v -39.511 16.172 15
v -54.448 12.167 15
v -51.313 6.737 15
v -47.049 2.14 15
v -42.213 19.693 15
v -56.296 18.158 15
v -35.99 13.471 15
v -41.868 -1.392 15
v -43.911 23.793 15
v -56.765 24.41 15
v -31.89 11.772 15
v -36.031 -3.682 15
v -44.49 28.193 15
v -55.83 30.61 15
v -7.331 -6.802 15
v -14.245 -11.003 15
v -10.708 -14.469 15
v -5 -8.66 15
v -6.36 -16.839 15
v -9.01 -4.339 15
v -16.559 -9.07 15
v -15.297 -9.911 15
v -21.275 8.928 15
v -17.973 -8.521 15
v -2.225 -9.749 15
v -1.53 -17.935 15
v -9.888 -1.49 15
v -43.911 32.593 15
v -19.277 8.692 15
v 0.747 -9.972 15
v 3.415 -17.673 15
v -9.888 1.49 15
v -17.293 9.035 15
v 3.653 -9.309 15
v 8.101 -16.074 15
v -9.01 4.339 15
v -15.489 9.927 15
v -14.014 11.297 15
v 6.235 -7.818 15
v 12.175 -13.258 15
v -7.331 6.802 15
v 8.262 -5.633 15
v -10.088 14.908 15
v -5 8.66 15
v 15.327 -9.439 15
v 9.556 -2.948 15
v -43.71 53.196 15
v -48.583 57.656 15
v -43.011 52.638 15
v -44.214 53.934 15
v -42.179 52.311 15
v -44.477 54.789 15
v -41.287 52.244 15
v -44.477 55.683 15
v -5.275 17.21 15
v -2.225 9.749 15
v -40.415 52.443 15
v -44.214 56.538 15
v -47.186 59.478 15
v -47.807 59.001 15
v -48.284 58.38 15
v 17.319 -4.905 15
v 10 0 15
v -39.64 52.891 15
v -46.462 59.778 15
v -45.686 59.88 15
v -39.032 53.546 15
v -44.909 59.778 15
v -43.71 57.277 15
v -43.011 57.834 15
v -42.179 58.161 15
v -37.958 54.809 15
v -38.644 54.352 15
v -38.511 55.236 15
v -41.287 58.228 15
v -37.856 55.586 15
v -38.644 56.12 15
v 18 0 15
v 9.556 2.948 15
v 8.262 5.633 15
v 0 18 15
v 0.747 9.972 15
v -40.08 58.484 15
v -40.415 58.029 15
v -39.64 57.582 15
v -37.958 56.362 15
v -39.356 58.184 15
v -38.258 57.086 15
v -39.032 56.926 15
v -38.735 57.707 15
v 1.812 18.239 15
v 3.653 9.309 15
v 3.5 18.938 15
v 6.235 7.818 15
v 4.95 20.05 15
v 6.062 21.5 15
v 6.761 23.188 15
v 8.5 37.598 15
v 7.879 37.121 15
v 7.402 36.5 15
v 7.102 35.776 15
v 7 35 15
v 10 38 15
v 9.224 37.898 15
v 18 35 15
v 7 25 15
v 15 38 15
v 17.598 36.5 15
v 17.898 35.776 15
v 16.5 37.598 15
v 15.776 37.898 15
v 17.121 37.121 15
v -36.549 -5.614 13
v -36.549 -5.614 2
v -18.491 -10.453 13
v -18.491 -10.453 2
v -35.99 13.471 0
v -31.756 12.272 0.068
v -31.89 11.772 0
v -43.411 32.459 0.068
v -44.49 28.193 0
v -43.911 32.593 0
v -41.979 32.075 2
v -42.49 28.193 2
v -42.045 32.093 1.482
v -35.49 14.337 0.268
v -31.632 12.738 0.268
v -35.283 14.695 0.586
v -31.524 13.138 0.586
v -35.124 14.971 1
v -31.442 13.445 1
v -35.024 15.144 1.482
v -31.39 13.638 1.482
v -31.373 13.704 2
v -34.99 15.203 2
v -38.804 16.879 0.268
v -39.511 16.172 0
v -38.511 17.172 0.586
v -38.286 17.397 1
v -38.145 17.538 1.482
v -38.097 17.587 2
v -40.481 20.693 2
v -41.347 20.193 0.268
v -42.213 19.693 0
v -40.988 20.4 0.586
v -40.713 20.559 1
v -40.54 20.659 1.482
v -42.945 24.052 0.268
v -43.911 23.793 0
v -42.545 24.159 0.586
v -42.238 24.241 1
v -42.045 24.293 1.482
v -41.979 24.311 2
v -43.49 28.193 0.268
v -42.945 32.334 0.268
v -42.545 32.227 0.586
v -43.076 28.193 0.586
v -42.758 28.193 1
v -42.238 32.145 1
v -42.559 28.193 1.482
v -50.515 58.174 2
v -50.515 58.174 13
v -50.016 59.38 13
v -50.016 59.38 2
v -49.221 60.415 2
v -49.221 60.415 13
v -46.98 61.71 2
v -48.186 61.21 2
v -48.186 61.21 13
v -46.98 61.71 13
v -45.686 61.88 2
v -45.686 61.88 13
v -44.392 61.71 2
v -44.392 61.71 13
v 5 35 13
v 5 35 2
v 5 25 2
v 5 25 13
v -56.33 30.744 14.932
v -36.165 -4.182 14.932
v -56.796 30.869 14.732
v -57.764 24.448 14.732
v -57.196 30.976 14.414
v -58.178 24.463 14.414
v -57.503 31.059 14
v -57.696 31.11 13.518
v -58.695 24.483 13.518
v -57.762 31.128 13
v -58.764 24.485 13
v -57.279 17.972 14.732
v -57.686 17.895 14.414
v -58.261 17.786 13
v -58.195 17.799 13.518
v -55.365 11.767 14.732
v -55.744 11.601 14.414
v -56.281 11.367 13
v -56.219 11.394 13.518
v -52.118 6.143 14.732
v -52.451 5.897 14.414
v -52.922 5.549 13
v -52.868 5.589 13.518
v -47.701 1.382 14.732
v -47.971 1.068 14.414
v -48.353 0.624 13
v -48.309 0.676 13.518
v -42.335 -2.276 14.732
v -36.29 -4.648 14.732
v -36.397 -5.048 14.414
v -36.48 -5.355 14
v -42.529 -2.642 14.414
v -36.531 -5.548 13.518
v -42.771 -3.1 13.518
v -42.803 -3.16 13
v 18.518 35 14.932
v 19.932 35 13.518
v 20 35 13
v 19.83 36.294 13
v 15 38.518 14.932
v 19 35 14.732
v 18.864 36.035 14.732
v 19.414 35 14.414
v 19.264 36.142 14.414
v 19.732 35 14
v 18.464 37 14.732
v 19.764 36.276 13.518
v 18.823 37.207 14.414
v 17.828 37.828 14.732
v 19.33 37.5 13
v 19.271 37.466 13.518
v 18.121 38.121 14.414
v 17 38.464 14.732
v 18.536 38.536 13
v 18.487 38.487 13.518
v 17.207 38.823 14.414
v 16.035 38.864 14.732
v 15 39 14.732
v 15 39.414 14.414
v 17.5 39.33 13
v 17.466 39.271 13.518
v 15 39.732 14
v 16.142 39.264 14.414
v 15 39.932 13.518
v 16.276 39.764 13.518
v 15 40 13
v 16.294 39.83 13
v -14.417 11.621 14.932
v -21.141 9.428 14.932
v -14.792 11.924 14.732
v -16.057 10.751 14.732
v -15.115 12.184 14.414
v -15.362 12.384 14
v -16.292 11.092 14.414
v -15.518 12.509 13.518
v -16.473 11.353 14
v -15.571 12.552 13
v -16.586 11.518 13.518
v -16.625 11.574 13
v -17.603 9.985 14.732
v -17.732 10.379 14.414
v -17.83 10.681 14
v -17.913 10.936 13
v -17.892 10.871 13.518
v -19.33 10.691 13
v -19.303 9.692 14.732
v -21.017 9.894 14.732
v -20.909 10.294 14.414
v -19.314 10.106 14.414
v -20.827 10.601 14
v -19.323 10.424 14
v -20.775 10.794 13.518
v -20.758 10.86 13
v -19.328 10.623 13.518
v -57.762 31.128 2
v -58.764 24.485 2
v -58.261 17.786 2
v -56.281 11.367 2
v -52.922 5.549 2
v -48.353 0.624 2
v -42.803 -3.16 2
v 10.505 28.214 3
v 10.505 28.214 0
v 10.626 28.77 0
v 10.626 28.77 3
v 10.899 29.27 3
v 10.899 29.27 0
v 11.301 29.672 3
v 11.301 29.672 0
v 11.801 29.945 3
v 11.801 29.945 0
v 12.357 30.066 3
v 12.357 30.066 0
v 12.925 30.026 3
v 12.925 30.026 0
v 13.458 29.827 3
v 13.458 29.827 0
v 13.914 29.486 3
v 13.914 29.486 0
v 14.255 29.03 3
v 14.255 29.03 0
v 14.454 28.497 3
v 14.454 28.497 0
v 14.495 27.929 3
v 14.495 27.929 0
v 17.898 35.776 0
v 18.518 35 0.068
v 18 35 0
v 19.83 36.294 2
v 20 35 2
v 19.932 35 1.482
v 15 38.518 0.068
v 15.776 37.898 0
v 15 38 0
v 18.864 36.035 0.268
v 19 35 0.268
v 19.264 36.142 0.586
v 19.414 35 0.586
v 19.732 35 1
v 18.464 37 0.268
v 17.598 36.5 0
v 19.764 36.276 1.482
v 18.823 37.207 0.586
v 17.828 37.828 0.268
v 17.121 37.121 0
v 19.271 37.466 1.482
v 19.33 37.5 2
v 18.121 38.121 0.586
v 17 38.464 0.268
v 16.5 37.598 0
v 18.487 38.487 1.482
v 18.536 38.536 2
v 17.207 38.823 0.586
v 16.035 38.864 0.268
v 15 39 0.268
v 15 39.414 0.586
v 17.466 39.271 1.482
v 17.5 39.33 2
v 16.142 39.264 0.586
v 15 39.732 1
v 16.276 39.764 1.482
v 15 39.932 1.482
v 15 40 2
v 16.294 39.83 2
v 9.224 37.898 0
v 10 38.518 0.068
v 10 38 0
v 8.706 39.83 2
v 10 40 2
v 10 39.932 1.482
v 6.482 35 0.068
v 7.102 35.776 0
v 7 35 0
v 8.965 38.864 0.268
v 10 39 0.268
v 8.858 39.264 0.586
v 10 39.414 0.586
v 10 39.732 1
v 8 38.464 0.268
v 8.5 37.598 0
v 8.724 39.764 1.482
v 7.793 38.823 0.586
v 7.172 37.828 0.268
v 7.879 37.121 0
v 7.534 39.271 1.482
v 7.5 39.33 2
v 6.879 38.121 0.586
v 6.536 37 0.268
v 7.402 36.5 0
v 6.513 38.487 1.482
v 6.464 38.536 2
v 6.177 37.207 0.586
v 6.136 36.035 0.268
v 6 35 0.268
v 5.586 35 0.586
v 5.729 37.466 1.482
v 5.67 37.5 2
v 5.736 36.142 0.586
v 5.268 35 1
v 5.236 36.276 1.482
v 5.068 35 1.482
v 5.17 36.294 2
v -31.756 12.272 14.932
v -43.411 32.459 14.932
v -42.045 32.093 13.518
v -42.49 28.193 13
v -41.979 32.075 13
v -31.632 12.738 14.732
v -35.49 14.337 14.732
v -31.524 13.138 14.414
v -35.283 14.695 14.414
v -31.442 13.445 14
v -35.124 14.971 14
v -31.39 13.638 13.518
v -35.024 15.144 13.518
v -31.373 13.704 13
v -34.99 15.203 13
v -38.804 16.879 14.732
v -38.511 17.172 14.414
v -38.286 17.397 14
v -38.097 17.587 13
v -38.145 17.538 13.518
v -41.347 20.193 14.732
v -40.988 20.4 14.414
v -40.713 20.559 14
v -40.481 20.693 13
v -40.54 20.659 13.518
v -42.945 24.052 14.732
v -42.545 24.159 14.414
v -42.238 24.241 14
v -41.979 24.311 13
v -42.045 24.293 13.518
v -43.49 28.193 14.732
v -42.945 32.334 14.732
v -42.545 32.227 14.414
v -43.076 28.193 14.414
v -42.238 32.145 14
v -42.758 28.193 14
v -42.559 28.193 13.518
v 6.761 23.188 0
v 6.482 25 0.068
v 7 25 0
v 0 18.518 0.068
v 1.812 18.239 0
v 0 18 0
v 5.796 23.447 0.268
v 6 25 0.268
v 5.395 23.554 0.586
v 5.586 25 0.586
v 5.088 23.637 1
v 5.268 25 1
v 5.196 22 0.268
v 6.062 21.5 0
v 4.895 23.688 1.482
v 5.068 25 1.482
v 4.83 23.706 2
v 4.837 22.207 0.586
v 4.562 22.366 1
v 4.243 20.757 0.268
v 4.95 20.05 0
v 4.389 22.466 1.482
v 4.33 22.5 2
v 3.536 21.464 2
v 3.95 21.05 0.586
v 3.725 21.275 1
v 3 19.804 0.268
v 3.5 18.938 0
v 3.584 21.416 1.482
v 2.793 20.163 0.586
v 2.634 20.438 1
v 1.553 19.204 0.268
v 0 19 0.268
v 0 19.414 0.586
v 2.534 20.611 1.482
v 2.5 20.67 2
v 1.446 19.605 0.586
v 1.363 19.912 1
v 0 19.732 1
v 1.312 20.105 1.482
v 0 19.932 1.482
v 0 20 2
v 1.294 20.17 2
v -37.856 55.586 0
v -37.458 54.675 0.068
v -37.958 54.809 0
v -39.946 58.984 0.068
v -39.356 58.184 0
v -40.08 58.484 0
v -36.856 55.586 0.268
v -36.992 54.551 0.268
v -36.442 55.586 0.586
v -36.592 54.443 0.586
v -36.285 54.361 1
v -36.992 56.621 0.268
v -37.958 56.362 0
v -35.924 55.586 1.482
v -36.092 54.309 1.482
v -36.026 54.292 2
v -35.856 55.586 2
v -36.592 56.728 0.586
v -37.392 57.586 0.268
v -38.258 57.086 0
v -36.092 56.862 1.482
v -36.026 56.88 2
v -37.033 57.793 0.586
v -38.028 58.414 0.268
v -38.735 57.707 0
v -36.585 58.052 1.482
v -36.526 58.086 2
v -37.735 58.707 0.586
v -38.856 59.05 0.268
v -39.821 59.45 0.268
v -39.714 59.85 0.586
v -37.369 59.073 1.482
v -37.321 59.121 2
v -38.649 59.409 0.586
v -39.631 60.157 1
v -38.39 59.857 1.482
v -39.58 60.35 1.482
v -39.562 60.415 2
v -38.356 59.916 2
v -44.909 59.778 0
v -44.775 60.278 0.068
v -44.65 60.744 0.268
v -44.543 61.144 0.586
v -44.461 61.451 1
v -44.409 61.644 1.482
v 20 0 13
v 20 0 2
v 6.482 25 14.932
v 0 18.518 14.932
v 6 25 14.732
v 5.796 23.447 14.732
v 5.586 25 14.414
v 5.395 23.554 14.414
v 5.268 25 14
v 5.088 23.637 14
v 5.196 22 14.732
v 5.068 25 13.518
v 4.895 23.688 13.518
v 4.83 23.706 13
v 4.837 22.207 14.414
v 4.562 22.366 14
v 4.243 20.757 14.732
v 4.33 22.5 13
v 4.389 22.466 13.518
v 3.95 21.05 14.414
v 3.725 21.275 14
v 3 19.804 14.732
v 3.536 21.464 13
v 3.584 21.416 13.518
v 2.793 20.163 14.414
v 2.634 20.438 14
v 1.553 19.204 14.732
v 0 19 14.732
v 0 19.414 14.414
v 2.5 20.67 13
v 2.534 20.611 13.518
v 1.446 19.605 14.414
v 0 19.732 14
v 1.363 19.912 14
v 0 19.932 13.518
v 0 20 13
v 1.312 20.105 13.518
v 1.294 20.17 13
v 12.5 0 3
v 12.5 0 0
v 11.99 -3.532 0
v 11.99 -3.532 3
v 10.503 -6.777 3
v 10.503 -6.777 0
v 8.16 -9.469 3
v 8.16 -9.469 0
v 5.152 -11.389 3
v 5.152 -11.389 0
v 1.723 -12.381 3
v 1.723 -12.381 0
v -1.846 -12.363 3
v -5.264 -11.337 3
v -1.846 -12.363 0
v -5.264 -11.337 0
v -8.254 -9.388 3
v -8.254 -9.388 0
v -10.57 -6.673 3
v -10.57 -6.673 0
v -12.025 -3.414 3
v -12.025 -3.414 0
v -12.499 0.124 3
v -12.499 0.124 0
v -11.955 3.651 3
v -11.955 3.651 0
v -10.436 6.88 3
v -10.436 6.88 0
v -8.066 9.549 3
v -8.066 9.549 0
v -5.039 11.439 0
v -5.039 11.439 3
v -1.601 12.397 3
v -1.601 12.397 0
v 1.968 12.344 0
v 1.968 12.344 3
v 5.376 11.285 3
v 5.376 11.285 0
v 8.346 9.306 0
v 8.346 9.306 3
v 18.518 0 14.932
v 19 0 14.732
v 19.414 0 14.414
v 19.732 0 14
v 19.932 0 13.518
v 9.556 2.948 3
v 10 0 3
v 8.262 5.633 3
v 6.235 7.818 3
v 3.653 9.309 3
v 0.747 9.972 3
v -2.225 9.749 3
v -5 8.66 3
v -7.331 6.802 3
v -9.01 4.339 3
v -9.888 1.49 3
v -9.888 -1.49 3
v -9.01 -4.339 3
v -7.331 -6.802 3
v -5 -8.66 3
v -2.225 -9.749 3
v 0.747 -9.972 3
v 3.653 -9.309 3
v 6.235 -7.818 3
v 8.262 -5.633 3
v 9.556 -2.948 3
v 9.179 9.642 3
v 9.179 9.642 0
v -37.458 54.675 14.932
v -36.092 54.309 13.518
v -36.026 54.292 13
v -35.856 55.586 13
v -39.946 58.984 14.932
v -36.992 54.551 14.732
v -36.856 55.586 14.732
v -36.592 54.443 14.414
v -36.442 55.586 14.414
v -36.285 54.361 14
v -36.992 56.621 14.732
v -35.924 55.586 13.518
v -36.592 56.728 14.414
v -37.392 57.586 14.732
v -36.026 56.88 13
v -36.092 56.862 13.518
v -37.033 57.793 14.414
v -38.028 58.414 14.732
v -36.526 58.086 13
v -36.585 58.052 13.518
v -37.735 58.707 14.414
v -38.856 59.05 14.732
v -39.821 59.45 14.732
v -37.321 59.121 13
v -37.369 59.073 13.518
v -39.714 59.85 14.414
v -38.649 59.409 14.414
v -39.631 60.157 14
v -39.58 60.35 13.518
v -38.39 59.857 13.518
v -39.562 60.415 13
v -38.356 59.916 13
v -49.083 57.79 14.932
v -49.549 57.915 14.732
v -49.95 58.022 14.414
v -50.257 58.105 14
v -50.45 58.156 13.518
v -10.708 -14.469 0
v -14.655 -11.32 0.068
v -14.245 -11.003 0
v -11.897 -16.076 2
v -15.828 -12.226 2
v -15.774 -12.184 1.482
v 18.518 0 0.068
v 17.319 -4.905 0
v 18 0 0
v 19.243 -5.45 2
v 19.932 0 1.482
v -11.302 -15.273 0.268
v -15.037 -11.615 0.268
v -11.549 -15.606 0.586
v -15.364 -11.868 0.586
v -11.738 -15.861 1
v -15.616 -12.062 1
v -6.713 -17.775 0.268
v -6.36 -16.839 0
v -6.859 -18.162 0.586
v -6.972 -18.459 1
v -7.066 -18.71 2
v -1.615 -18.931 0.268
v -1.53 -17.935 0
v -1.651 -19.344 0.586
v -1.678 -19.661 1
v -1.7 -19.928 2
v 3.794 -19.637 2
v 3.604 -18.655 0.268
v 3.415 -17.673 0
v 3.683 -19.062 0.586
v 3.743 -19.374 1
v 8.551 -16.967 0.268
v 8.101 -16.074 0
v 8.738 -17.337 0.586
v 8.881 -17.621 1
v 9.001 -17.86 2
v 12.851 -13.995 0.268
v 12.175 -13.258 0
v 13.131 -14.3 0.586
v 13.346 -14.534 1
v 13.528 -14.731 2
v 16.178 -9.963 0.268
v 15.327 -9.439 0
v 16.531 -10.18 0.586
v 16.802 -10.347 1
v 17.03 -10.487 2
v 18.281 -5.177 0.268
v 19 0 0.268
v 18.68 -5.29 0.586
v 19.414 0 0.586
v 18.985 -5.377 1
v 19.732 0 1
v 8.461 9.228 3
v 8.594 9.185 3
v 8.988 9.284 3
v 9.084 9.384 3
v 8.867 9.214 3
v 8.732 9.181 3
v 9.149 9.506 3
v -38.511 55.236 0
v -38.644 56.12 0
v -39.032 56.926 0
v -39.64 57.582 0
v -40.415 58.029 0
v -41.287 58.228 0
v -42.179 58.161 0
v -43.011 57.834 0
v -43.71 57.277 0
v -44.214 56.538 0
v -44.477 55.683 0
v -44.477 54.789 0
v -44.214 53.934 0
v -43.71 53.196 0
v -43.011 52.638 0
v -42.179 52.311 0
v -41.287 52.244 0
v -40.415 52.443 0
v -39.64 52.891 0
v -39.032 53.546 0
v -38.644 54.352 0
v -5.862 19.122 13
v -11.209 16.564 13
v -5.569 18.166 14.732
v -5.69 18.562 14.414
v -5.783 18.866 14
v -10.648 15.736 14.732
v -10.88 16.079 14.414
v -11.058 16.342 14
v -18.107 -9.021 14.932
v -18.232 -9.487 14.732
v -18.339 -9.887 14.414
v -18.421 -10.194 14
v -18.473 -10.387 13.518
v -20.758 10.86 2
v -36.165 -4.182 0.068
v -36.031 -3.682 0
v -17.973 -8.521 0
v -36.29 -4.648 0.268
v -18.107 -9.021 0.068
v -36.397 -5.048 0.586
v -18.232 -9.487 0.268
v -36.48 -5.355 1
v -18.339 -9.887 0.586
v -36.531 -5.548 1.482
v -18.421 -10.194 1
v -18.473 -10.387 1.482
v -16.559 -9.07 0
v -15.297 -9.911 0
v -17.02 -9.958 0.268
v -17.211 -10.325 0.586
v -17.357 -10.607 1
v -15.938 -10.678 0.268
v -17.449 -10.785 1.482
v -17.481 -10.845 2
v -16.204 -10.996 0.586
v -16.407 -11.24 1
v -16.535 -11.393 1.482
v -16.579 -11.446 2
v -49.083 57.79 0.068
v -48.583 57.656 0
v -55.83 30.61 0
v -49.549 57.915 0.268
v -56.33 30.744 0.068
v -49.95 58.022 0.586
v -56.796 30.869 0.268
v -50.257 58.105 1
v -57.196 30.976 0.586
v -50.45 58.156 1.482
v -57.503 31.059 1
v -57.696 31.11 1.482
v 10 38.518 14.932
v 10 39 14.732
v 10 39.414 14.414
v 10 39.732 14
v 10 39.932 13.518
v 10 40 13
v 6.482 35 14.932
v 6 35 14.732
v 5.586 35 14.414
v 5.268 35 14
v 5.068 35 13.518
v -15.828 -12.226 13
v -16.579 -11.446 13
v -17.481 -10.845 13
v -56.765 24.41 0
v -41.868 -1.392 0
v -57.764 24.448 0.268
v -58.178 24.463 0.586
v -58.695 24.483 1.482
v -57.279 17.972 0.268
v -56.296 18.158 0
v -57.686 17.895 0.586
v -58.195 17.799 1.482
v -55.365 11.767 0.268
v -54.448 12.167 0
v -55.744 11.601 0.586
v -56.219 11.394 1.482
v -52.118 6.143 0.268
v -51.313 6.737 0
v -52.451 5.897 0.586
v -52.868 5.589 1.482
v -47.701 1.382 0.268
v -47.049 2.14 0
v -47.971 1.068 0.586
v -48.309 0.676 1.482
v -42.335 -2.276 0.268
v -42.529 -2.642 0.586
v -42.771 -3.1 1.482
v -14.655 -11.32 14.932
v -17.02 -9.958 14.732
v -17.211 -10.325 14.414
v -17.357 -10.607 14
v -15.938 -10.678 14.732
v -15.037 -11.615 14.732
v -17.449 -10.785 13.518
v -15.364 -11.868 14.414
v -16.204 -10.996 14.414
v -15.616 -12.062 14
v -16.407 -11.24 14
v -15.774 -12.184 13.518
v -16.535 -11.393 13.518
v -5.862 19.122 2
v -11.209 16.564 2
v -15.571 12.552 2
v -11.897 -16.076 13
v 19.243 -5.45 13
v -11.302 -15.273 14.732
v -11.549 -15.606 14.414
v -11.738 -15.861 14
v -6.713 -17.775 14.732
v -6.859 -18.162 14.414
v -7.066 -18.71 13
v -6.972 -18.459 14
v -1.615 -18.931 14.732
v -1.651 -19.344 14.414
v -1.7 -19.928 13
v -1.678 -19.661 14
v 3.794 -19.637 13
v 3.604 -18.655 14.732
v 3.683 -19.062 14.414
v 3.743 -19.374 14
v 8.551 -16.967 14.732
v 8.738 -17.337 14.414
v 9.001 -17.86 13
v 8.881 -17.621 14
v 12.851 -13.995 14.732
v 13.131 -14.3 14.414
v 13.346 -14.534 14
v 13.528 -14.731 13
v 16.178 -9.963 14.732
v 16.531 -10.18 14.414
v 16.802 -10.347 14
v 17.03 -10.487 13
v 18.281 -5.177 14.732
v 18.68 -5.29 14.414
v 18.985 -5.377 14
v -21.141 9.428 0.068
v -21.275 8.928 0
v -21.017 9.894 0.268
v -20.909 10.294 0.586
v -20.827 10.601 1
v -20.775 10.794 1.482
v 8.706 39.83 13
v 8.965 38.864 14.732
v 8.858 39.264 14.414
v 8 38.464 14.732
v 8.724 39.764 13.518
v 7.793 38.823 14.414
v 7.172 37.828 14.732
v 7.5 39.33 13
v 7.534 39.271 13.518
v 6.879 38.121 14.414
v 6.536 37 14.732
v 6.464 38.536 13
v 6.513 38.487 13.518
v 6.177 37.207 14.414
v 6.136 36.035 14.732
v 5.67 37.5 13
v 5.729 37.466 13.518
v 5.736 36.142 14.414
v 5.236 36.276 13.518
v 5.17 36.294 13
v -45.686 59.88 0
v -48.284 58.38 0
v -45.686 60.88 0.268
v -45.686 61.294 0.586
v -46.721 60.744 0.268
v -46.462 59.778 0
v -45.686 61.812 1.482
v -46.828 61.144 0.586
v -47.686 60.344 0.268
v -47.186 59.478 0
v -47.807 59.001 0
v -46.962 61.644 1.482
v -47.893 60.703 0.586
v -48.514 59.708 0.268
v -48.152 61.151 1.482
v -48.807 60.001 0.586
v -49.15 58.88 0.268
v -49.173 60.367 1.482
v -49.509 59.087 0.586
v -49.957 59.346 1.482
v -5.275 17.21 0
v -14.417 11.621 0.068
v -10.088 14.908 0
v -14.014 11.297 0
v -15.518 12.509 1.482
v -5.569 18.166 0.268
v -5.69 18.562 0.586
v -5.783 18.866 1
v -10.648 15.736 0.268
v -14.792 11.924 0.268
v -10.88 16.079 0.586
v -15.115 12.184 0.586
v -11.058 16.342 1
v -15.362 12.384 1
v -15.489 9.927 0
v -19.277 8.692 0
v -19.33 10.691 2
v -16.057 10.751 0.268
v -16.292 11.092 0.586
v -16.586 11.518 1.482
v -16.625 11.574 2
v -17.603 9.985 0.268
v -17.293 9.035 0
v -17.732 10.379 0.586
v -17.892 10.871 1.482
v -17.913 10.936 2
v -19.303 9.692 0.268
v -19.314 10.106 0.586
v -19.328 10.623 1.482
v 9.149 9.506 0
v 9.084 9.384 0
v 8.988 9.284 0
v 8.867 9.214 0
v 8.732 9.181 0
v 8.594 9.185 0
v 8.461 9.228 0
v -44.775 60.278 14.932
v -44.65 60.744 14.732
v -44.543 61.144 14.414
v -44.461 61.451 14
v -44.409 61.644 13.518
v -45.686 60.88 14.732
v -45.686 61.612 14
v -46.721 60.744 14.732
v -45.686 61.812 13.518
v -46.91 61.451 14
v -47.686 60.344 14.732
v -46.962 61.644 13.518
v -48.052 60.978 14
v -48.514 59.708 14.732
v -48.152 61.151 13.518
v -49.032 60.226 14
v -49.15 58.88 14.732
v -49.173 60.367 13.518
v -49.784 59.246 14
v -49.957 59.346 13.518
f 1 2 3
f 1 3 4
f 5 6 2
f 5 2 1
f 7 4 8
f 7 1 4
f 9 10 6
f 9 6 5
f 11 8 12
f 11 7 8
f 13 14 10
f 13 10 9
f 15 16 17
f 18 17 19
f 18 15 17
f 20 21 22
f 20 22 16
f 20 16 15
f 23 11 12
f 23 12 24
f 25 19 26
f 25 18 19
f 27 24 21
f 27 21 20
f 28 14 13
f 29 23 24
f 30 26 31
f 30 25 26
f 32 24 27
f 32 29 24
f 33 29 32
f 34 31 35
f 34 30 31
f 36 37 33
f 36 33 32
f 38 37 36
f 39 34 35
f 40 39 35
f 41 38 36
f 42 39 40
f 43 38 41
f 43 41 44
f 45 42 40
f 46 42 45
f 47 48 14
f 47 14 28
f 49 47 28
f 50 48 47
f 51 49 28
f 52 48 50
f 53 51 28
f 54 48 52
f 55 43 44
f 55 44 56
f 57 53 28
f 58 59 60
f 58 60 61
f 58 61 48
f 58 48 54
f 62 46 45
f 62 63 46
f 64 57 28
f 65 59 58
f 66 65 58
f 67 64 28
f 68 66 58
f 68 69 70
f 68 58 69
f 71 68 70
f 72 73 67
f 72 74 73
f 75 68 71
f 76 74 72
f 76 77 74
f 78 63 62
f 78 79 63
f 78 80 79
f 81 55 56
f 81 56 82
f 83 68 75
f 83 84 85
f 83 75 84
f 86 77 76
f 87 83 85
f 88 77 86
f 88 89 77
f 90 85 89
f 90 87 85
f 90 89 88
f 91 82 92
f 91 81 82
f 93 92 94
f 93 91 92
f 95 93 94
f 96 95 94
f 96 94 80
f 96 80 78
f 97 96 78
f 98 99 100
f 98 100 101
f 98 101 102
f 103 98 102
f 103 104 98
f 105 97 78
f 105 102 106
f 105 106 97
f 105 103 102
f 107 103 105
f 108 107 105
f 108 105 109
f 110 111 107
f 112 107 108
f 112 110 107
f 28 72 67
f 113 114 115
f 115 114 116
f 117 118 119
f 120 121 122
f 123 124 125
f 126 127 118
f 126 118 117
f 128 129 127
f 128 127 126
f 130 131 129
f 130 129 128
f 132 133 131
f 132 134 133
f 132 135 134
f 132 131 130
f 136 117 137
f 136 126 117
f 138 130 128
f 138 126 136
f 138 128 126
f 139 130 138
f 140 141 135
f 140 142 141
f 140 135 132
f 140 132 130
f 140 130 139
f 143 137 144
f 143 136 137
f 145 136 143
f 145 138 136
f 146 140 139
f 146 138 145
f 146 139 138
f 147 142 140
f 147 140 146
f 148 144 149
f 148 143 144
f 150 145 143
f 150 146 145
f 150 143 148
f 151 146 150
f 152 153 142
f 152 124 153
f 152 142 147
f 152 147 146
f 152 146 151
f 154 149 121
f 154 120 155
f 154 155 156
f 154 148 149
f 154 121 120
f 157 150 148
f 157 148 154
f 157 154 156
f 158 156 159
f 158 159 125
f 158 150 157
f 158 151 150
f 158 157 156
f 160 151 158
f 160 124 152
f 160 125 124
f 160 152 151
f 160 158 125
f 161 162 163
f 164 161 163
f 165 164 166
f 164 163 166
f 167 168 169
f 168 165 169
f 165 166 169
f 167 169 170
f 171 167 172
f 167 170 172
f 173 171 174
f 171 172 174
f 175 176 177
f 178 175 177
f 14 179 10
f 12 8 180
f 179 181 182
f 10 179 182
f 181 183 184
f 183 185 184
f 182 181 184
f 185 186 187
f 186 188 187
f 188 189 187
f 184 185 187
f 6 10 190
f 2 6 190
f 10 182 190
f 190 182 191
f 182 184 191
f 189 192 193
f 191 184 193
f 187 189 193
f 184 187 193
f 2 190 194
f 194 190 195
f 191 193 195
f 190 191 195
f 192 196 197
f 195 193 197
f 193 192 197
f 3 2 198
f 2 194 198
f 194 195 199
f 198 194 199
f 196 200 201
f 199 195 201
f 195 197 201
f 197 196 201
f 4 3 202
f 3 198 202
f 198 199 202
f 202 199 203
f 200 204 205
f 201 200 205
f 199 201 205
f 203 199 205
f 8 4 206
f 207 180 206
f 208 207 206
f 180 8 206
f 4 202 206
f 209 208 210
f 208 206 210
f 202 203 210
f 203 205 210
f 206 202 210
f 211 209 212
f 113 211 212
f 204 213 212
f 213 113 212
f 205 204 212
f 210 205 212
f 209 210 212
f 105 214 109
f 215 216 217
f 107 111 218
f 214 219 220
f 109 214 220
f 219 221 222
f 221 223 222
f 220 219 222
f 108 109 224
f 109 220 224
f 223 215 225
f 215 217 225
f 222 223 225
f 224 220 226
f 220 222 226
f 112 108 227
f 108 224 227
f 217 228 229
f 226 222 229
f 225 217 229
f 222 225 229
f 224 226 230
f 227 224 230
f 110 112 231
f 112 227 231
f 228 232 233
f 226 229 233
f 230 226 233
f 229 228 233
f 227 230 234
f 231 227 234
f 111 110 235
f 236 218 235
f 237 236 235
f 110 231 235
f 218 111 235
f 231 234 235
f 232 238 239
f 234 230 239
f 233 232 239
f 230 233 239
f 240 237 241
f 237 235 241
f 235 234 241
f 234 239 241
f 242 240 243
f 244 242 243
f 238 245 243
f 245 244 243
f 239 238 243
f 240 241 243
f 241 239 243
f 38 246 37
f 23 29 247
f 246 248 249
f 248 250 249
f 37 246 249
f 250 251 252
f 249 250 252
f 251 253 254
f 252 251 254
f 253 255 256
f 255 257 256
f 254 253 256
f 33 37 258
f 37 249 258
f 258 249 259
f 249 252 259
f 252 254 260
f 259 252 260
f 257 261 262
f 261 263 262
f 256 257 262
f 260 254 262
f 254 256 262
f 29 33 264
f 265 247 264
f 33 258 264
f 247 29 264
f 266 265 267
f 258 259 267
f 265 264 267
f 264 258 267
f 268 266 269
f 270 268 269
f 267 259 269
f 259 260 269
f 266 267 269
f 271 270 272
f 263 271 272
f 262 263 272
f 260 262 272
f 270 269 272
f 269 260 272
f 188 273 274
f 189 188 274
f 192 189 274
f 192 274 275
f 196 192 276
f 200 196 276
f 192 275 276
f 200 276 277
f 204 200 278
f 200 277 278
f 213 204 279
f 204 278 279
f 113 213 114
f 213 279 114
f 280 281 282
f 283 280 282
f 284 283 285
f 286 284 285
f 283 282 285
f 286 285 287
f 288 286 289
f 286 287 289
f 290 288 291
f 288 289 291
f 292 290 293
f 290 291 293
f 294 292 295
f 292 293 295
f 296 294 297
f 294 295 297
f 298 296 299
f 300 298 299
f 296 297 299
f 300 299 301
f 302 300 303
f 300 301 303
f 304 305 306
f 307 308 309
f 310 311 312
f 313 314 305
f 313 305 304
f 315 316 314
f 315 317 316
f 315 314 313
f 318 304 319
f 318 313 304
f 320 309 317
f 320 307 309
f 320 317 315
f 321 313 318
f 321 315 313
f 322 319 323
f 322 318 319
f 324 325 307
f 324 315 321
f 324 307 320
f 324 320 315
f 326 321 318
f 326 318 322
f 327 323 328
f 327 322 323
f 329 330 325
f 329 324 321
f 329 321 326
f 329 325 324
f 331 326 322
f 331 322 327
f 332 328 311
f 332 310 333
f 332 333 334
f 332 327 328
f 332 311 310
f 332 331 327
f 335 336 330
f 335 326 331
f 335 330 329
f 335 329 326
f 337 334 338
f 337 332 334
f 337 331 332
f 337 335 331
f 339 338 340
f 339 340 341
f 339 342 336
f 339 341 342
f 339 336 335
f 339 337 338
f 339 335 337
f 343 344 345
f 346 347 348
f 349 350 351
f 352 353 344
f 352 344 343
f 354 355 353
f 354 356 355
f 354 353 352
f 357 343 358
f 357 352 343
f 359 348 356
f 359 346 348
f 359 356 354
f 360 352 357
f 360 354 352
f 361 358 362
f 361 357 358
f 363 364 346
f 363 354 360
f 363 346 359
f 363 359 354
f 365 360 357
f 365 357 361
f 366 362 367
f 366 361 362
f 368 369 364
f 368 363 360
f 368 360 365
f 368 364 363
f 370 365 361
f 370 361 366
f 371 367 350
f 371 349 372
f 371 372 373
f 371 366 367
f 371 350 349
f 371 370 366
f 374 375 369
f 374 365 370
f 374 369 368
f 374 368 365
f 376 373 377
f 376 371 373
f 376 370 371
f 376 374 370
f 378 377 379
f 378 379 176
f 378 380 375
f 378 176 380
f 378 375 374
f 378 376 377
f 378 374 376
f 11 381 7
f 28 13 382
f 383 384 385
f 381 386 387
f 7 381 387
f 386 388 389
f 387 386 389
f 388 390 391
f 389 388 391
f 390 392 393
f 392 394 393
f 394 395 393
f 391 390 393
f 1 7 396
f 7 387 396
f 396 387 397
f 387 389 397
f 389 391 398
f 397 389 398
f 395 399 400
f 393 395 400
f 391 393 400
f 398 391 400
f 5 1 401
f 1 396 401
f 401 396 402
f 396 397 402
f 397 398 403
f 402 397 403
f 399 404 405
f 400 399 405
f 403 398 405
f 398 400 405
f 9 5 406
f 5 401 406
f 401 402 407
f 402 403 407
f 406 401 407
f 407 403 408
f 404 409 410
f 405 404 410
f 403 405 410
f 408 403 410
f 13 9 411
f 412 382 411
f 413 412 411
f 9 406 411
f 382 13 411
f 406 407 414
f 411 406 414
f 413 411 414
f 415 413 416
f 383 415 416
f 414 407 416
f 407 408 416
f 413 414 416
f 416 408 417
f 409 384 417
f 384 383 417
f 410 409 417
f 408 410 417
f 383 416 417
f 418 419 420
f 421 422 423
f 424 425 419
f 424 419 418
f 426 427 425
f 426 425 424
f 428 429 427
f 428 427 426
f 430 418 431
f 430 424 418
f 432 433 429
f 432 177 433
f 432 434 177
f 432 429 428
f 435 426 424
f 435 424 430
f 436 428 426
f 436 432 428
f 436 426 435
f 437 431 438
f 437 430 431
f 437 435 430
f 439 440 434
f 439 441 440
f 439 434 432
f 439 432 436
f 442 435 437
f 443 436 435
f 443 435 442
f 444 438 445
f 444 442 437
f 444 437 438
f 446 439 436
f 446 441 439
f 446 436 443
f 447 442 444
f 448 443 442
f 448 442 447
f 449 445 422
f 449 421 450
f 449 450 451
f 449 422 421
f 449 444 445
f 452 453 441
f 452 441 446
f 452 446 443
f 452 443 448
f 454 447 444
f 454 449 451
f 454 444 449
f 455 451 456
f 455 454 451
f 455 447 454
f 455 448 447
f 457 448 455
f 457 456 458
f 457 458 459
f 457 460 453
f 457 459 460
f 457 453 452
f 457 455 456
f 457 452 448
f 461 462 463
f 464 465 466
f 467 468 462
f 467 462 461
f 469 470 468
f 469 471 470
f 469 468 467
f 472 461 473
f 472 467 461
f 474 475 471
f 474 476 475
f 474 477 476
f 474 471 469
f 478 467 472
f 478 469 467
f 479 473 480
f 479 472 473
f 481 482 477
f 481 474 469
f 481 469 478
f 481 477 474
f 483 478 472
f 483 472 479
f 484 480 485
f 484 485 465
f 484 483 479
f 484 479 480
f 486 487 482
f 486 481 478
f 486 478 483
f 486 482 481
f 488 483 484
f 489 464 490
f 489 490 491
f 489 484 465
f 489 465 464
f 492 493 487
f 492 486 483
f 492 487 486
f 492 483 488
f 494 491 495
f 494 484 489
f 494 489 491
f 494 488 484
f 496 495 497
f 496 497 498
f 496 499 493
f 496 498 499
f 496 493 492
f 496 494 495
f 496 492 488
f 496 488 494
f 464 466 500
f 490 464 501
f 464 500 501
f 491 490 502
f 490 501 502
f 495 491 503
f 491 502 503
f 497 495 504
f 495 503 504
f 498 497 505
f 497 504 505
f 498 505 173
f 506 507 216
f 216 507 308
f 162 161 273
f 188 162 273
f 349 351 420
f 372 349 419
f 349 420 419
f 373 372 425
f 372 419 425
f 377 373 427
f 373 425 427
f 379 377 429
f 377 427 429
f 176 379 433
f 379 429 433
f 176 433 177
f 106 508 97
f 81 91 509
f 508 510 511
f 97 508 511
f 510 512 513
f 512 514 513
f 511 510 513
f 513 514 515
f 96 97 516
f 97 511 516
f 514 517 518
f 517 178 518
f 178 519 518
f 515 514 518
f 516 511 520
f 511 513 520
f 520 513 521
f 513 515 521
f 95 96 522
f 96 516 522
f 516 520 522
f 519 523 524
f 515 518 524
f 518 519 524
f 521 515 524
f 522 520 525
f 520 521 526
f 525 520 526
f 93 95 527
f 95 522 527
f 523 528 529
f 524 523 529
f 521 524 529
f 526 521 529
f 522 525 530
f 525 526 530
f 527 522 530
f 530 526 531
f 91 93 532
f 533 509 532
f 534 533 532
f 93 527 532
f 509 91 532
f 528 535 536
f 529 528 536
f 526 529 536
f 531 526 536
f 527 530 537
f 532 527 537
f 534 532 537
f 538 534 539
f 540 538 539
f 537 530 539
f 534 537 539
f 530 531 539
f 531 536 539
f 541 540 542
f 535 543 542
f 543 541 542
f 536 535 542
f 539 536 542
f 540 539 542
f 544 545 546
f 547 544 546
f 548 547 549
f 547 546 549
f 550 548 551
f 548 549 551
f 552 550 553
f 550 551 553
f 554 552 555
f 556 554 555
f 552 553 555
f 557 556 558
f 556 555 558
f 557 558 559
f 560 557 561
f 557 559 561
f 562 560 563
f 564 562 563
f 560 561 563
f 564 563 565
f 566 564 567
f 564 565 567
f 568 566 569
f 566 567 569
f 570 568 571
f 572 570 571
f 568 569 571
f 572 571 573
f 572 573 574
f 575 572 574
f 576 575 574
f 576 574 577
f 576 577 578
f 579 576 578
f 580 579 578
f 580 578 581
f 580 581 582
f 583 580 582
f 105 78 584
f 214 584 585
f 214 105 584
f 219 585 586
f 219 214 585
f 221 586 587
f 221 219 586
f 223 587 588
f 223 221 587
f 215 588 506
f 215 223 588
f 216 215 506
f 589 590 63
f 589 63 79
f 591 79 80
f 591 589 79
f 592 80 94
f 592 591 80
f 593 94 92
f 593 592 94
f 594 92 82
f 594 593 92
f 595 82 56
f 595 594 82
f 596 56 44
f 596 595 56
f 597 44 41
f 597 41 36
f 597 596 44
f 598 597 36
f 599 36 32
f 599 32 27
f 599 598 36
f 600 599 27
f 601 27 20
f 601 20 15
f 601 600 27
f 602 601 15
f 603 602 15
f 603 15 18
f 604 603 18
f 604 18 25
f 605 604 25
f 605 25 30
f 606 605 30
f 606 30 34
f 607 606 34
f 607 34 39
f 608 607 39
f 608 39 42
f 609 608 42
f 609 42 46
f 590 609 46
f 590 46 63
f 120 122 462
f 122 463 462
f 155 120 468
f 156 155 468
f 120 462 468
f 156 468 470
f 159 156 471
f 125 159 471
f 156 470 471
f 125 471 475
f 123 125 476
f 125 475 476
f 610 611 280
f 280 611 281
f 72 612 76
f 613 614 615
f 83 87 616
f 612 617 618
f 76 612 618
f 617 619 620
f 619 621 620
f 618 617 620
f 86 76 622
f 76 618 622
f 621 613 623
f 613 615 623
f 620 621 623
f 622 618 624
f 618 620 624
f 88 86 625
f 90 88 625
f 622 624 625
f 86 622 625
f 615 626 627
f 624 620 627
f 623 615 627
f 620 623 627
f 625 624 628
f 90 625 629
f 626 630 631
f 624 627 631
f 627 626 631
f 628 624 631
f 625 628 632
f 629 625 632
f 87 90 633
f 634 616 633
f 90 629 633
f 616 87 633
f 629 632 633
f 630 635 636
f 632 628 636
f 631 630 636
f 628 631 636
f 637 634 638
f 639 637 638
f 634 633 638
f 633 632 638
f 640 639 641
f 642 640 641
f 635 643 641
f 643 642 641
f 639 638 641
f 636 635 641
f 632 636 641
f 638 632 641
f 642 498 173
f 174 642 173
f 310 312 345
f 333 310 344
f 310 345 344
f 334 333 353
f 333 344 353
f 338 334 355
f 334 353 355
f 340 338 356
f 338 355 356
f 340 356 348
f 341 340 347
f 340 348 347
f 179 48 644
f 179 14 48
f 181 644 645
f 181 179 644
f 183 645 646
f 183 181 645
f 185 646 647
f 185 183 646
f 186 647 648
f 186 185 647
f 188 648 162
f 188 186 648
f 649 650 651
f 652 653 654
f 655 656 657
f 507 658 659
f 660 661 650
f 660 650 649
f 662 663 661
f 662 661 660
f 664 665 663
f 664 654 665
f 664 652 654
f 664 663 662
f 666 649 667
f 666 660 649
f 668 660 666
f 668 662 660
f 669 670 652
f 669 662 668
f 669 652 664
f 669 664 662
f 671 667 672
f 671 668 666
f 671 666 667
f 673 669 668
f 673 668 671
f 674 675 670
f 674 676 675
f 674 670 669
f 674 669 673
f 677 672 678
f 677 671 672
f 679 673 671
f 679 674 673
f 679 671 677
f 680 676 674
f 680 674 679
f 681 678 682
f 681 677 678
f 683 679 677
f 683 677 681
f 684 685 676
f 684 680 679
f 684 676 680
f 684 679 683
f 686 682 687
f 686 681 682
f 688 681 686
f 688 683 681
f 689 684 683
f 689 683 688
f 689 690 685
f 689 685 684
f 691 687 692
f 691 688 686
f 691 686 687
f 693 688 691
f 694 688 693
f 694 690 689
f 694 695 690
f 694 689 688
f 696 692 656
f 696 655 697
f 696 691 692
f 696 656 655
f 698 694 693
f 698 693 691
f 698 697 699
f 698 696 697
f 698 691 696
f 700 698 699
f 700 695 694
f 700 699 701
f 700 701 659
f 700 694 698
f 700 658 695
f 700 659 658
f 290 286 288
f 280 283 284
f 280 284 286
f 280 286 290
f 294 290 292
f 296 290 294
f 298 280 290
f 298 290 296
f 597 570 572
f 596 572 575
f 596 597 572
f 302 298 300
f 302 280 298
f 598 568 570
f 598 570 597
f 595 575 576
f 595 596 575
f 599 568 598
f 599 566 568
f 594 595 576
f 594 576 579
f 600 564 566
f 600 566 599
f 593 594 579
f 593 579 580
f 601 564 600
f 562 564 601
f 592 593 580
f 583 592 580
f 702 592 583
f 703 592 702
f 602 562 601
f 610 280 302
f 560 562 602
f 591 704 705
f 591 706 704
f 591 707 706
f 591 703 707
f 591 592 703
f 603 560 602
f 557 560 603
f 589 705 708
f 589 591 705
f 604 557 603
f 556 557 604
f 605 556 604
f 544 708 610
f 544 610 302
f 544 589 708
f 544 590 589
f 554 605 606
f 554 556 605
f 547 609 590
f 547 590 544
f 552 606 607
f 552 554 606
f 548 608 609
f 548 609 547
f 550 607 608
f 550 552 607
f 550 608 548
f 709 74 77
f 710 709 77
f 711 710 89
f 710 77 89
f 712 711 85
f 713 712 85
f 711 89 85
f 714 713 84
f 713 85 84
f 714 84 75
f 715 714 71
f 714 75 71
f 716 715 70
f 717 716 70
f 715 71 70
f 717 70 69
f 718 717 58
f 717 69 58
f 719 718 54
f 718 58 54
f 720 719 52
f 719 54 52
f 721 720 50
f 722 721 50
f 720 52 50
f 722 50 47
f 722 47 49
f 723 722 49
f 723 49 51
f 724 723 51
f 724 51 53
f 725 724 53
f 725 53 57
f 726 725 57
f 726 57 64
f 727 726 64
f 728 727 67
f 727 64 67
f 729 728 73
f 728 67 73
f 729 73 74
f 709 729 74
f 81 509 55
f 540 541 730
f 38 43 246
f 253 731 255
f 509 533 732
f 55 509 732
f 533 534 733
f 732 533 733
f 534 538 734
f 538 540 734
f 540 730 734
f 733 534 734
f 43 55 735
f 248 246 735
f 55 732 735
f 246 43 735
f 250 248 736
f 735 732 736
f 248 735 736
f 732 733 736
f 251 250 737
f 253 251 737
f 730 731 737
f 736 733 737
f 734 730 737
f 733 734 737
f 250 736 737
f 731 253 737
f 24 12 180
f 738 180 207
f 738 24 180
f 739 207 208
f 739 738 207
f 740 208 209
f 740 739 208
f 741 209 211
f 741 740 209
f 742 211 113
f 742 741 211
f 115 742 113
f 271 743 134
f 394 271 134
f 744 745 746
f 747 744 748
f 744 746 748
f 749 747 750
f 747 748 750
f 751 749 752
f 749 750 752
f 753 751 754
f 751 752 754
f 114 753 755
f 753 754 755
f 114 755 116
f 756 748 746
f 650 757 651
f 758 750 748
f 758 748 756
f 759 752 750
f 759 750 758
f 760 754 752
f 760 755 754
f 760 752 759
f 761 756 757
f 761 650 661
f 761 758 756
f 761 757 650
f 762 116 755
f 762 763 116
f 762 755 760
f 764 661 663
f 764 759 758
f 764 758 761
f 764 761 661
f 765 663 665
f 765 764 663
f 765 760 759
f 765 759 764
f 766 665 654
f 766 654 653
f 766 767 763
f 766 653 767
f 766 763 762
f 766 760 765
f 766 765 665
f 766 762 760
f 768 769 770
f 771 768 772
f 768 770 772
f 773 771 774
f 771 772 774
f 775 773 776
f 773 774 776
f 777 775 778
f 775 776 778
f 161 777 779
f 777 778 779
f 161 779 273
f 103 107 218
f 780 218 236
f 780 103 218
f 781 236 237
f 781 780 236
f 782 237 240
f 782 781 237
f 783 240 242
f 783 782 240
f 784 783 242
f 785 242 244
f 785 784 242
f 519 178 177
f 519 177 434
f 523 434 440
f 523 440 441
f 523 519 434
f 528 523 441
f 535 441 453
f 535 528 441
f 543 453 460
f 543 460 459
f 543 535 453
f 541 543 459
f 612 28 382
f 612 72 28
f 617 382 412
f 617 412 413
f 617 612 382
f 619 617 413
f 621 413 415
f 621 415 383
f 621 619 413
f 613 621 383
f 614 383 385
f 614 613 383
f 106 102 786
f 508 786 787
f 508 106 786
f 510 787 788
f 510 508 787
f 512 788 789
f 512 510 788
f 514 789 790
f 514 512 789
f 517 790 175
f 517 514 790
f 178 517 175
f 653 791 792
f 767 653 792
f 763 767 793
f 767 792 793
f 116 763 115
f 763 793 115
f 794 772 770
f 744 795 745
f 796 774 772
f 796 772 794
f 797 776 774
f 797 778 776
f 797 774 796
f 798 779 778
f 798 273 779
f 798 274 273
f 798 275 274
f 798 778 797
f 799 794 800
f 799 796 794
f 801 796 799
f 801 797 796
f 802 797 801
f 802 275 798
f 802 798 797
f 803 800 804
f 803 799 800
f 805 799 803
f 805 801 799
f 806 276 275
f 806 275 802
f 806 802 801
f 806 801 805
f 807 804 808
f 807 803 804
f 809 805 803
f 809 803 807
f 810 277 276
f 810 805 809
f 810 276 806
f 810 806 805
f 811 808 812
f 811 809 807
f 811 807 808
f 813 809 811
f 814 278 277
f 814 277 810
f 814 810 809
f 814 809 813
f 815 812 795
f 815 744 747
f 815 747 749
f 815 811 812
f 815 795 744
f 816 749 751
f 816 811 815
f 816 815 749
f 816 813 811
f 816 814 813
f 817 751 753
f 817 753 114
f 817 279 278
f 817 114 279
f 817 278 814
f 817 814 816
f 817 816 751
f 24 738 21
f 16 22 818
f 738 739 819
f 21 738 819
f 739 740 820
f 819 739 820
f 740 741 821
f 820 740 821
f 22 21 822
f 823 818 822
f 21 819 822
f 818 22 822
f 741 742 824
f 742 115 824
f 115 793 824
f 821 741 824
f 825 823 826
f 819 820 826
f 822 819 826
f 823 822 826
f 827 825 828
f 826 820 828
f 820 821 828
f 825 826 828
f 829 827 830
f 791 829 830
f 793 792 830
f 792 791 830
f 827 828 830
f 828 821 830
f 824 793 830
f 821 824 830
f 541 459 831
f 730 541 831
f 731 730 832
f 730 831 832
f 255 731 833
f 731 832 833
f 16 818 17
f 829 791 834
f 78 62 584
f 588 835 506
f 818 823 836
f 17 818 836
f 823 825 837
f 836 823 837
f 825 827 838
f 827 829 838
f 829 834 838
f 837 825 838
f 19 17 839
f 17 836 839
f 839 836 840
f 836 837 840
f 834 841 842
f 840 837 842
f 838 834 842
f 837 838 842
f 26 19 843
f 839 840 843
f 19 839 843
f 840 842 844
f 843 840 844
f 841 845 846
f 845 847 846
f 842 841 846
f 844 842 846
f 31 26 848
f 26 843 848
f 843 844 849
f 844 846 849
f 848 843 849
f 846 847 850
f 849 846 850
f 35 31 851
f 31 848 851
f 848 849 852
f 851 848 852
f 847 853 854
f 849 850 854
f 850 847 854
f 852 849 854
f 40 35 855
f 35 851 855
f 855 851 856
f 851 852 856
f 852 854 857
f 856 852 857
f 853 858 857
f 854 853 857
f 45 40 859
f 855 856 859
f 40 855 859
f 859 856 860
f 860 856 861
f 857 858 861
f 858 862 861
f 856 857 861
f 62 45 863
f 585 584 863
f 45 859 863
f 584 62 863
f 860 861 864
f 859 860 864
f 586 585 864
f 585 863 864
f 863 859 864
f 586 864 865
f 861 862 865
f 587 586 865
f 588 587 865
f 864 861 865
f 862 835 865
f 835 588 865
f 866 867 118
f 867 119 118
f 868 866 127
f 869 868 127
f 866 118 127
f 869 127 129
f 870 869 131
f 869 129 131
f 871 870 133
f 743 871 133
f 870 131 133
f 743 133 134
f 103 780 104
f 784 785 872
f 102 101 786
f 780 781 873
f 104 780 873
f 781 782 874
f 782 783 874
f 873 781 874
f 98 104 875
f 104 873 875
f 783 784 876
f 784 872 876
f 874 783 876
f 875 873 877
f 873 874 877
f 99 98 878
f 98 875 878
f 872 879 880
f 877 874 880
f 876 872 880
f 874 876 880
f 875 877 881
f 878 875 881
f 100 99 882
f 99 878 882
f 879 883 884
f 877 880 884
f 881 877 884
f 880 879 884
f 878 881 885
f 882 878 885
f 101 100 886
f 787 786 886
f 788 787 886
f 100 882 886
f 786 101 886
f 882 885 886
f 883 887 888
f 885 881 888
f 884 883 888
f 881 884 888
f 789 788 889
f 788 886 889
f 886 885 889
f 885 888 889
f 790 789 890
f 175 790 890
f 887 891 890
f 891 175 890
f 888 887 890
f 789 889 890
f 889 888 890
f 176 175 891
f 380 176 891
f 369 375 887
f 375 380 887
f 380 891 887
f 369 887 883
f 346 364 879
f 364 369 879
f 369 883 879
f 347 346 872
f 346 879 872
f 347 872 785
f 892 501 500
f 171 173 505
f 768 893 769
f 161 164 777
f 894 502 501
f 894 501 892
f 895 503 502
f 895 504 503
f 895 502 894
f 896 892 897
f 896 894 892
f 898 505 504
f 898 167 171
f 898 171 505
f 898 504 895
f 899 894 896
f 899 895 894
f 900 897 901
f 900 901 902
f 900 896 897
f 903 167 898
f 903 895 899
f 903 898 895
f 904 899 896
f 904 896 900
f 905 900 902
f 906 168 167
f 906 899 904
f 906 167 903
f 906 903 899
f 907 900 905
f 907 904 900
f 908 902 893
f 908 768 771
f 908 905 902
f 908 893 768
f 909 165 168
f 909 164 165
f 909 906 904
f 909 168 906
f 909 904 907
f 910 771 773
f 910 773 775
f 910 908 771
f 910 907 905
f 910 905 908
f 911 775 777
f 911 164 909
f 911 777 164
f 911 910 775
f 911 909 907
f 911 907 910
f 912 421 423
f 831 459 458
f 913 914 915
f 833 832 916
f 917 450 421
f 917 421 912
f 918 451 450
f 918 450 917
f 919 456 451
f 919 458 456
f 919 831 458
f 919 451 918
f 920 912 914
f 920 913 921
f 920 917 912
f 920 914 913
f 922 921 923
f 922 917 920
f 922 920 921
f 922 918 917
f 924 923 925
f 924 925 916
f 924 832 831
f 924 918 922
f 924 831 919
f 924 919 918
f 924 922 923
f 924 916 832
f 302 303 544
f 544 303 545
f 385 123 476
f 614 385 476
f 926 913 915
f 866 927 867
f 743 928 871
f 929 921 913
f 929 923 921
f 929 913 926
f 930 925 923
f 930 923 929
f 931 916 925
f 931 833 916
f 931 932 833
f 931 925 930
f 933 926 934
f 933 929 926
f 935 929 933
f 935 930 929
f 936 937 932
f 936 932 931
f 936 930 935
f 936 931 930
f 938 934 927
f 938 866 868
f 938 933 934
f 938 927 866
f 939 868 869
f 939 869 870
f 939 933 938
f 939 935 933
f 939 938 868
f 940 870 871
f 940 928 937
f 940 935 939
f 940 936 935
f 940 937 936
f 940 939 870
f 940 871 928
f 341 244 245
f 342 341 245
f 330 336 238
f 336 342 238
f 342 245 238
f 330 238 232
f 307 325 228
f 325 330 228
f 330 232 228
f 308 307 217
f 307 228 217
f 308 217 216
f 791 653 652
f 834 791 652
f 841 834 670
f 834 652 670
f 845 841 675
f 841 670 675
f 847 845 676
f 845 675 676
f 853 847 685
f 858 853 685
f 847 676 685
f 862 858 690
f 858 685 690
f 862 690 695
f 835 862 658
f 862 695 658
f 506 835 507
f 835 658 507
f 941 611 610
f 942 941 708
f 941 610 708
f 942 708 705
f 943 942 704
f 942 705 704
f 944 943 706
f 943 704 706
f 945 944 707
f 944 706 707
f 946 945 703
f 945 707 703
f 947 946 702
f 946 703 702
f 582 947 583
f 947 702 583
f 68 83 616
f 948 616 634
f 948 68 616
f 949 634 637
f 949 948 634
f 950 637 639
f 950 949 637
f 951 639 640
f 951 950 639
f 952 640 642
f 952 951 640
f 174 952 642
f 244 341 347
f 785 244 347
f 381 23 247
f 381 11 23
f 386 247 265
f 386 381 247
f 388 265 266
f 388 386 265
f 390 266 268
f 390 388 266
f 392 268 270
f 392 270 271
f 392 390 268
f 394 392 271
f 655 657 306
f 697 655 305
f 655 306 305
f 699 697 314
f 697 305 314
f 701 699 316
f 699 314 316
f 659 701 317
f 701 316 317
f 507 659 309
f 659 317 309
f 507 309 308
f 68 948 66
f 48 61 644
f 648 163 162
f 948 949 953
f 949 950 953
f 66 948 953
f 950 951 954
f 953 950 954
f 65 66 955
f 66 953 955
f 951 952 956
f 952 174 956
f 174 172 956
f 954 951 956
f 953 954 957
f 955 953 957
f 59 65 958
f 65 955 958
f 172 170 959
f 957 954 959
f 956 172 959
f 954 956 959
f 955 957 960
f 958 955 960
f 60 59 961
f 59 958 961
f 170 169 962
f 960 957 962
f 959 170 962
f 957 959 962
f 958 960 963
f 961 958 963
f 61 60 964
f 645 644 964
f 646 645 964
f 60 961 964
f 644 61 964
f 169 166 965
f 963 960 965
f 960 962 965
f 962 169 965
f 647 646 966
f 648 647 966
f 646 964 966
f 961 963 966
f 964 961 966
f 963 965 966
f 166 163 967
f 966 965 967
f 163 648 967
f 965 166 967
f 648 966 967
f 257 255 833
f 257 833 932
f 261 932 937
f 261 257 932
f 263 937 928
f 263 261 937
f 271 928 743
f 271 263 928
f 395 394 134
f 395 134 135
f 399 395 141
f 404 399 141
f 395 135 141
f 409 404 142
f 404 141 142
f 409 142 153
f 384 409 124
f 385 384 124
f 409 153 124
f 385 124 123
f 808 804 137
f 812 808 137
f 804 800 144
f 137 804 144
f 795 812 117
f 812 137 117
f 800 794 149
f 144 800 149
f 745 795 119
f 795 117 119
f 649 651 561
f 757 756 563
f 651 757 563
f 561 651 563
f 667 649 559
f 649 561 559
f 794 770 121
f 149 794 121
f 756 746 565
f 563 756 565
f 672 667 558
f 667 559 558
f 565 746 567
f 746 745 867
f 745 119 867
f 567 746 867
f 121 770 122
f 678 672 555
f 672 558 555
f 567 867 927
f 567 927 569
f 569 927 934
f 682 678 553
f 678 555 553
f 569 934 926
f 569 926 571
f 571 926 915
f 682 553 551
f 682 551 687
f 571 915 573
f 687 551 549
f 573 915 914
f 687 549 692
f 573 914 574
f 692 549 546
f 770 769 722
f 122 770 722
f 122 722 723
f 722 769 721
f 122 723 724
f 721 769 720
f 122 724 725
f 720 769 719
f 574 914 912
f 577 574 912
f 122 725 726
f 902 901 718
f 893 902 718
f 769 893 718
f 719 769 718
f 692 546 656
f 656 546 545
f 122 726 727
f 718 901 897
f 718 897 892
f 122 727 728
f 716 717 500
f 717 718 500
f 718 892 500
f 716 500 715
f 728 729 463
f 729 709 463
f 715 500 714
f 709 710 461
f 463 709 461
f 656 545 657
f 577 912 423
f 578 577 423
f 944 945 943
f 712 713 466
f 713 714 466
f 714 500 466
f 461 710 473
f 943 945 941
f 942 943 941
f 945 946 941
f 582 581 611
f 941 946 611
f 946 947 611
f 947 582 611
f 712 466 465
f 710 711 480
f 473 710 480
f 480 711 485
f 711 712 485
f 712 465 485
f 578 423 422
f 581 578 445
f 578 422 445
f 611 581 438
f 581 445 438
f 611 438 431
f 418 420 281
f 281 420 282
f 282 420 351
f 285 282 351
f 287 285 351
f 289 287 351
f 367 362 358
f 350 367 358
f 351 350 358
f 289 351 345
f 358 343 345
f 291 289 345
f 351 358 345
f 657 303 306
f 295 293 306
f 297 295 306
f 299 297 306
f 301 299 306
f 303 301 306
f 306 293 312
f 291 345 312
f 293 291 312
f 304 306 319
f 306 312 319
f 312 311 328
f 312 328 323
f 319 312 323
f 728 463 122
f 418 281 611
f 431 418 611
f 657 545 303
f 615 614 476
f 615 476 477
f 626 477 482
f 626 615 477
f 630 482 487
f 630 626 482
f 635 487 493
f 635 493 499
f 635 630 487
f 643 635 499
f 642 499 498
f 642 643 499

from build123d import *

# Parameters (mm, degrees)
F0_R     = 10
F1_DEPTH = 15
F2_R     = 5
F3_R     = 5
F4_R     = 2
F6_DEPTH = 3
F7_R     = 3
F8_DEPTH = 15
F9_R     = 0.5


with BuildPart() as f1:
    # F0 (on Top) → F1 (new body)
    with BuildSketch(Plane.XY):
        with BuildLine():
            Line((-36.549074, -5.614274), (-16.757368, -10.917446))
            ThreePointArc((-16.757368, -10.917446), (-19.991912, -0.568736), (-17.35093, 9.947122))
            Line((-17.35093, 9.947122), (-31.372693, 13.704243))
            ThreePointArc((-31.372693, 13.704243), (-40.480789, 20.69313), (-41.979295, 32.075416))
            Line((-41.979295, 32.075416), (-34.732362, 59.121339))
            Line((-34.732362, 59.121339), (-49.221249, 63.003624))
            Line((-49.221249, 63.003624), (-57.762278, 31.128072))
            ThreePointArc((-57.762278, 31.128072), (-54.765265, 8.363501), (-36.549074, -5.614274))
        make_face()
        with BuildLine():
            ThreePointArc((-16.757368, -10.917446), (5.694411, -19.172211), (20, 0))
            ThreePointArc((20, 0), (15.811388, 12.247449), (5, 19.364917))
            ThreePointArc((5, 19.364917), (-7.765956, 18.430679), (-17.35093, 9.947122))
            ThreePointArc((-17.35093, 9.947122), (-19.991912, -0.568736), (-16.757368, -10.917446))
        make_face()
        Circle(F0_R, mode=Mode.SUBTRACT)
        with BuildLine():
            ThreePointArc((5, 19.364917), (15.811388, 12.247449), (20, 0))
            Line((20, 0), (20, 40))
            Line((20, 40), (5, 40))
            Line((5, 40), (5, 19.364917))
        make_face()
    extrude(amount=F1_DEPTH)

    # F2
    f2_edges = [f1.edges().sort_by_distance(p)[0] for p in [
        (-17.35093, 9.947122, 7.5),
        (5, 19.364917, 7.5),
    ]]
    fillet(f2_edges, radius=F2_R)

    # F3
    f3_edges = [f1.edges().sort_by_distance(p)[0] for p in [
        (-49.221249, 63.003624, 7.5),
        (-34.732362, 59.121339, 7.5),
        (5, 40, 7.5),
        (20, 40, 7.5),
        (-16.757368, -10.917446, 7.5),
    ]]
    fillet(f3_edges, radius=F3_R)

    # F4
    f4_edges = [f1.edges().sort_by_distance(p)[0] for p in [
        (-54.138811, 44.651034, 15),
        (-26.065247, 12.282117, 0),
    ]]
    fillet(f4_edges, radius=F4_R)

    # F5 (on face) → F6 (cut)
    with BuildSketch(Plane(origin=(0, 0, 0), x_dir=(1, 0, 0), z_dir=(0, 0, -1))):
        with BuildLine():
            Line((14.494917, -27.928844), (12.5, 0))
            ThreePointArc((12.5, 0), (-11.619433, 4.608555), (9.101795, -8.567807))
            Line((9.101795, -8.567807), (10.505083, -28.213832))
            ThreePointArc((10.505083, -28.213832), (12.642494, -30.066255), (14.494917, -27.928844))
        make_face()
    extrude(amount=-F6_DEPTH, mode=Mode.SUBTRACT)

    # F7 (on face) → F8 (cut, through all)
    with BuildSketch(Plane.XY.offset(15)):
        with Locations((-41.510969, 55.236049)):
            Circle(F7_R)
    extrude(amount=-F8_DEPTH, mode=Mode.SUBTRACT)

    # F9
    f9_edges = [f1.edges().sort_by_distance(p)[0] for p in [
        (9.101795, 8.567807, 1.5),
    ]]
    fillet(f9_edges, radius=F9_R)


solid = f1.part
